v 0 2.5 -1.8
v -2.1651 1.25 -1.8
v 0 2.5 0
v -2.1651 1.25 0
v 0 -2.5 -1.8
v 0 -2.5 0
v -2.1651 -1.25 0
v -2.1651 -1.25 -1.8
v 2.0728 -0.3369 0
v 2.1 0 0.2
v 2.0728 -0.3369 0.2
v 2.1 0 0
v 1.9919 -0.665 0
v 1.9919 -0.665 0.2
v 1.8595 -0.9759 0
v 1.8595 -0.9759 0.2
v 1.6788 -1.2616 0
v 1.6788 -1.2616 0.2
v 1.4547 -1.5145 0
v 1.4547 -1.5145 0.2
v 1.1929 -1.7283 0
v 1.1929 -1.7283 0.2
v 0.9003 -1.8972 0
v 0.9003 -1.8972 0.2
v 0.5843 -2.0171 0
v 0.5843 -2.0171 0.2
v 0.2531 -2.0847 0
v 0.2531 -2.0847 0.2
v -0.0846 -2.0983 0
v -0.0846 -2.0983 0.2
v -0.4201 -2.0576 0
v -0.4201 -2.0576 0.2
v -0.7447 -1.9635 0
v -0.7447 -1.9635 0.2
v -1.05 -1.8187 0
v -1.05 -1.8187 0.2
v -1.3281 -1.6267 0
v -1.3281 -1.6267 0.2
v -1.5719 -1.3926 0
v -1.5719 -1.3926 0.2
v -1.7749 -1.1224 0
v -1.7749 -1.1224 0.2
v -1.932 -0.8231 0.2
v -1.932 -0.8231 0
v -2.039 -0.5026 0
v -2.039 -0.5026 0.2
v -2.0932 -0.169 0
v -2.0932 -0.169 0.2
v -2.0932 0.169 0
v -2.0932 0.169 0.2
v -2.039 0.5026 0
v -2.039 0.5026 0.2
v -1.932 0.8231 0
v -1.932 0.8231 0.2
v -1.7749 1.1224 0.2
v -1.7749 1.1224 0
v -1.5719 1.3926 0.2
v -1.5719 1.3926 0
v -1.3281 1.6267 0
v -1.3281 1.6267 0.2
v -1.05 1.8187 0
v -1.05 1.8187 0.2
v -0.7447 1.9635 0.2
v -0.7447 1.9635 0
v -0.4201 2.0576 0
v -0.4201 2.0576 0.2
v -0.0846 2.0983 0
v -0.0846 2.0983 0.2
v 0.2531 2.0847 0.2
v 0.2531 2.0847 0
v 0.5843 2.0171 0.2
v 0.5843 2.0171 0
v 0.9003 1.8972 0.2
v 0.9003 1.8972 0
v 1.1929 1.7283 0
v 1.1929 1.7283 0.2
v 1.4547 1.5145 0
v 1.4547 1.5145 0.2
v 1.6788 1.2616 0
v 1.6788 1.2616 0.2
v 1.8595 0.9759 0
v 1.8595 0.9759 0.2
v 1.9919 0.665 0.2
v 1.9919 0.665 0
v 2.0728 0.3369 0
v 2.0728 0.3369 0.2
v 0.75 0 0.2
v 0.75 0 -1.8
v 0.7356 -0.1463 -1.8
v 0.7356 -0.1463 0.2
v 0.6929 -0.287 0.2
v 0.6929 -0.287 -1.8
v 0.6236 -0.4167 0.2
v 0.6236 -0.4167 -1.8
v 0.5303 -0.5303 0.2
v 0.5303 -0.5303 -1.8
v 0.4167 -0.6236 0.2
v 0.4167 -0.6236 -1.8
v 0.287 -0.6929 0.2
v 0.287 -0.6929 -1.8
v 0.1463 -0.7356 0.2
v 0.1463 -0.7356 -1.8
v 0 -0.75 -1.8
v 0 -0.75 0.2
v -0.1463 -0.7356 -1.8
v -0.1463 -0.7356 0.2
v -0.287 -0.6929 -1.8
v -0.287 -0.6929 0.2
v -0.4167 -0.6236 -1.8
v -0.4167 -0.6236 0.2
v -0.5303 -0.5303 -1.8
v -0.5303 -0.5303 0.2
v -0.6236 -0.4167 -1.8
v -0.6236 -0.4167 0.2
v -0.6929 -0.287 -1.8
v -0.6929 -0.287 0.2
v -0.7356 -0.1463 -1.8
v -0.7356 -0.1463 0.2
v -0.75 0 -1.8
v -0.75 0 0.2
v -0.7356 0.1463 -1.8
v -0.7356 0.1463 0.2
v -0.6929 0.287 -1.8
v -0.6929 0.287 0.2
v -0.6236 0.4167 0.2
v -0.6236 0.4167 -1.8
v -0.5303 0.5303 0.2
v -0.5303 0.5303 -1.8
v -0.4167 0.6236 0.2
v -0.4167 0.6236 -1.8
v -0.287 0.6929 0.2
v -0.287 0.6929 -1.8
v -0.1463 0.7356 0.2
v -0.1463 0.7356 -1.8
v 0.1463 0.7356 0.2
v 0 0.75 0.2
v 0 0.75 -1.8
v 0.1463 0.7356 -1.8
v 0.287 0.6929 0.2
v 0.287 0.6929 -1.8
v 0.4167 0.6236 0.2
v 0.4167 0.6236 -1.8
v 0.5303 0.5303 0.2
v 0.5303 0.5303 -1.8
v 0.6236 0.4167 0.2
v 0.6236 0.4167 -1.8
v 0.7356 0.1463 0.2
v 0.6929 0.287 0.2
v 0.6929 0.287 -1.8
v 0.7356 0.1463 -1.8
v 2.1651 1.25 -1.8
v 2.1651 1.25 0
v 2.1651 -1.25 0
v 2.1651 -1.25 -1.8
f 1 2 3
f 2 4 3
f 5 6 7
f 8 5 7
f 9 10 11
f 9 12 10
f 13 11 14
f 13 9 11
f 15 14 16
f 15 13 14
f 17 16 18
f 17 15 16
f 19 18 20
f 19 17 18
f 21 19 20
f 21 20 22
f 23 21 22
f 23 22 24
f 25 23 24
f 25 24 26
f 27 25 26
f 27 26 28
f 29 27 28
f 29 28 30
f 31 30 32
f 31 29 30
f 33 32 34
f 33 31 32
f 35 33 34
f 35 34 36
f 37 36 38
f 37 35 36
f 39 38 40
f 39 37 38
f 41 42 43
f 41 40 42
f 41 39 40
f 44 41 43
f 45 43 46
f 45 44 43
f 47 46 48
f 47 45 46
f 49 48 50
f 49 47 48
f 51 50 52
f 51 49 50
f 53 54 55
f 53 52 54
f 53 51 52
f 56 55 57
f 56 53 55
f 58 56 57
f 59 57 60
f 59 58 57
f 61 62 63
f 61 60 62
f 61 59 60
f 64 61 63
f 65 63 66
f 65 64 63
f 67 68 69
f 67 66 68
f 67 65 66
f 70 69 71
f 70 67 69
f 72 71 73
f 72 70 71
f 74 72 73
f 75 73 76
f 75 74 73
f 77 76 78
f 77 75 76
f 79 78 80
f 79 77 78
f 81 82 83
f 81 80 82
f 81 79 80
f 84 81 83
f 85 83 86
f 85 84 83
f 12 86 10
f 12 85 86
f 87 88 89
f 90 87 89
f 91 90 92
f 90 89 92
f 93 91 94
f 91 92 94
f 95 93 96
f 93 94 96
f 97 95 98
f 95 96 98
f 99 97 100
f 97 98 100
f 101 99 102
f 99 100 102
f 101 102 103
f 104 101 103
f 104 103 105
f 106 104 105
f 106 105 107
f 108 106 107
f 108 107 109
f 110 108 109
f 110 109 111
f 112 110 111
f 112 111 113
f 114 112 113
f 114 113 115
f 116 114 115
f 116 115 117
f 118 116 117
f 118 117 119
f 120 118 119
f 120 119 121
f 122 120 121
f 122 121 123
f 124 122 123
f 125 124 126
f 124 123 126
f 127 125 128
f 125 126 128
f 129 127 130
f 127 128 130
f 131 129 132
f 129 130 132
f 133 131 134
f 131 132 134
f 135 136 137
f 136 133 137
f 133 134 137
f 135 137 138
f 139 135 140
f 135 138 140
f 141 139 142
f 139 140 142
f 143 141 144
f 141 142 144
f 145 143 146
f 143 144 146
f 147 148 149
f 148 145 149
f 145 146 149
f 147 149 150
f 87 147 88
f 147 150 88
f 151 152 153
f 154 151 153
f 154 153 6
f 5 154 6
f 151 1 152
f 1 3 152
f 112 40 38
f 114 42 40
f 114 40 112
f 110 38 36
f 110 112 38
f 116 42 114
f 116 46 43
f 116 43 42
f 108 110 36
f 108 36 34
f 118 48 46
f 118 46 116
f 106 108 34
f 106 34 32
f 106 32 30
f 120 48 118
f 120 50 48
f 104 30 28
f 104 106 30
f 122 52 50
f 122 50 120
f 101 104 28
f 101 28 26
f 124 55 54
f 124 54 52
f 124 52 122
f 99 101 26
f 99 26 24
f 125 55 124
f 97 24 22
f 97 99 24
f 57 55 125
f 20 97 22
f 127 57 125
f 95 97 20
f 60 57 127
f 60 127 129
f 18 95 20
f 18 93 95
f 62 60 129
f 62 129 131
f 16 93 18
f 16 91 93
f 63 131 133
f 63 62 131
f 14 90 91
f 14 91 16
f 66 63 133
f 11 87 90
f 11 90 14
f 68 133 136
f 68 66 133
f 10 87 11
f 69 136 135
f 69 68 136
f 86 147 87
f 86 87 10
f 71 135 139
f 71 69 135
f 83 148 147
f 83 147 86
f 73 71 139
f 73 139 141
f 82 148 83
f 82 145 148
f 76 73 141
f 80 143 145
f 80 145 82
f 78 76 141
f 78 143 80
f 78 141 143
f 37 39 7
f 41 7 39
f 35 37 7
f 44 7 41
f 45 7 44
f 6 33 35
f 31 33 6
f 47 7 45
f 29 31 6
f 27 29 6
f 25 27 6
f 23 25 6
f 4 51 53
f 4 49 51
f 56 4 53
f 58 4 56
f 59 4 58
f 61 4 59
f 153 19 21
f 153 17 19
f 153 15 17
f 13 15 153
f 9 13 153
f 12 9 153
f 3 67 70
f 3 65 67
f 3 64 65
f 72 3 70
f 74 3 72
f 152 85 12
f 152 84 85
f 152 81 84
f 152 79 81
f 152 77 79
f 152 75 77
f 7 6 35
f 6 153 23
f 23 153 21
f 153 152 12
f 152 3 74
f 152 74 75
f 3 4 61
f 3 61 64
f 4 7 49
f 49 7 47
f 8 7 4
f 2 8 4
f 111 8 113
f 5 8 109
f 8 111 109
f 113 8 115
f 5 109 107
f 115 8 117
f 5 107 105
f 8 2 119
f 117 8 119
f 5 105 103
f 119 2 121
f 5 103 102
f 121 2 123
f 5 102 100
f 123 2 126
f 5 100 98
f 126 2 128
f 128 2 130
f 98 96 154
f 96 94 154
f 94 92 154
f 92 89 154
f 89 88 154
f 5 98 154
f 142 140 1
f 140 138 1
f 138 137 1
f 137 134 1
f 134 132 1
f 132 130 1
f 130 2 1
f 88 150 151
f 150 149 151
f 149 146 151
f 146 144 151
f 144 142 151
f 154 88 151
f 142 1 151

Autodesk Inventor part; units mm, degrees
ref_plane "YZ Plane" through (0, 0, 0) normal (1, 0, 0) x (0, 1, 0)
ref_plane "XZ Plane" through (0, 0, 0) normal (0, 1, 0) x (-1, 0, 0)
ref_plane "XY Plane" through (0, 0, 0) normal (0, 0, 1) x (1, 0, 0)
sketch "スケッチ1" plane through (0, 0, 0) normal (0, 0, 1) x (1, 0, 0)
  line L0 (0, -2.5) -> (-2.1651, -1.25)
  line L1 (-2.1651, -1.25) -> (-2.1651, 1.25)
  line L2 (-2.1651, 1.25) -> (0, 2.5)
  line L3 (0, 2.5) -> (2.1651, 1.25)
  line L4 (2.1651, 1.25) -> (2.1651, -1.25)
  line L5 (2.1651, -1.25) -> (0, -2.5)
  circle A0 centre (0, 0) radius 0.75
  circle A1 centre (0, 0) radius 2.1
  dimension "d0" = 5
  dimension "d1" = 4.3301
  dimension "d2" = 1.5
  dimension "d3" = 4.2
extrude "押し出し1" add sketch "スケッチ1" against normal blind 1.8 contours L0 L1 L2 L3 L4 L5 | A1
extrude "押し出し2" add sketch "スケッチ1" along normal blind 0.2 contours A1
properties part number "ナット"
